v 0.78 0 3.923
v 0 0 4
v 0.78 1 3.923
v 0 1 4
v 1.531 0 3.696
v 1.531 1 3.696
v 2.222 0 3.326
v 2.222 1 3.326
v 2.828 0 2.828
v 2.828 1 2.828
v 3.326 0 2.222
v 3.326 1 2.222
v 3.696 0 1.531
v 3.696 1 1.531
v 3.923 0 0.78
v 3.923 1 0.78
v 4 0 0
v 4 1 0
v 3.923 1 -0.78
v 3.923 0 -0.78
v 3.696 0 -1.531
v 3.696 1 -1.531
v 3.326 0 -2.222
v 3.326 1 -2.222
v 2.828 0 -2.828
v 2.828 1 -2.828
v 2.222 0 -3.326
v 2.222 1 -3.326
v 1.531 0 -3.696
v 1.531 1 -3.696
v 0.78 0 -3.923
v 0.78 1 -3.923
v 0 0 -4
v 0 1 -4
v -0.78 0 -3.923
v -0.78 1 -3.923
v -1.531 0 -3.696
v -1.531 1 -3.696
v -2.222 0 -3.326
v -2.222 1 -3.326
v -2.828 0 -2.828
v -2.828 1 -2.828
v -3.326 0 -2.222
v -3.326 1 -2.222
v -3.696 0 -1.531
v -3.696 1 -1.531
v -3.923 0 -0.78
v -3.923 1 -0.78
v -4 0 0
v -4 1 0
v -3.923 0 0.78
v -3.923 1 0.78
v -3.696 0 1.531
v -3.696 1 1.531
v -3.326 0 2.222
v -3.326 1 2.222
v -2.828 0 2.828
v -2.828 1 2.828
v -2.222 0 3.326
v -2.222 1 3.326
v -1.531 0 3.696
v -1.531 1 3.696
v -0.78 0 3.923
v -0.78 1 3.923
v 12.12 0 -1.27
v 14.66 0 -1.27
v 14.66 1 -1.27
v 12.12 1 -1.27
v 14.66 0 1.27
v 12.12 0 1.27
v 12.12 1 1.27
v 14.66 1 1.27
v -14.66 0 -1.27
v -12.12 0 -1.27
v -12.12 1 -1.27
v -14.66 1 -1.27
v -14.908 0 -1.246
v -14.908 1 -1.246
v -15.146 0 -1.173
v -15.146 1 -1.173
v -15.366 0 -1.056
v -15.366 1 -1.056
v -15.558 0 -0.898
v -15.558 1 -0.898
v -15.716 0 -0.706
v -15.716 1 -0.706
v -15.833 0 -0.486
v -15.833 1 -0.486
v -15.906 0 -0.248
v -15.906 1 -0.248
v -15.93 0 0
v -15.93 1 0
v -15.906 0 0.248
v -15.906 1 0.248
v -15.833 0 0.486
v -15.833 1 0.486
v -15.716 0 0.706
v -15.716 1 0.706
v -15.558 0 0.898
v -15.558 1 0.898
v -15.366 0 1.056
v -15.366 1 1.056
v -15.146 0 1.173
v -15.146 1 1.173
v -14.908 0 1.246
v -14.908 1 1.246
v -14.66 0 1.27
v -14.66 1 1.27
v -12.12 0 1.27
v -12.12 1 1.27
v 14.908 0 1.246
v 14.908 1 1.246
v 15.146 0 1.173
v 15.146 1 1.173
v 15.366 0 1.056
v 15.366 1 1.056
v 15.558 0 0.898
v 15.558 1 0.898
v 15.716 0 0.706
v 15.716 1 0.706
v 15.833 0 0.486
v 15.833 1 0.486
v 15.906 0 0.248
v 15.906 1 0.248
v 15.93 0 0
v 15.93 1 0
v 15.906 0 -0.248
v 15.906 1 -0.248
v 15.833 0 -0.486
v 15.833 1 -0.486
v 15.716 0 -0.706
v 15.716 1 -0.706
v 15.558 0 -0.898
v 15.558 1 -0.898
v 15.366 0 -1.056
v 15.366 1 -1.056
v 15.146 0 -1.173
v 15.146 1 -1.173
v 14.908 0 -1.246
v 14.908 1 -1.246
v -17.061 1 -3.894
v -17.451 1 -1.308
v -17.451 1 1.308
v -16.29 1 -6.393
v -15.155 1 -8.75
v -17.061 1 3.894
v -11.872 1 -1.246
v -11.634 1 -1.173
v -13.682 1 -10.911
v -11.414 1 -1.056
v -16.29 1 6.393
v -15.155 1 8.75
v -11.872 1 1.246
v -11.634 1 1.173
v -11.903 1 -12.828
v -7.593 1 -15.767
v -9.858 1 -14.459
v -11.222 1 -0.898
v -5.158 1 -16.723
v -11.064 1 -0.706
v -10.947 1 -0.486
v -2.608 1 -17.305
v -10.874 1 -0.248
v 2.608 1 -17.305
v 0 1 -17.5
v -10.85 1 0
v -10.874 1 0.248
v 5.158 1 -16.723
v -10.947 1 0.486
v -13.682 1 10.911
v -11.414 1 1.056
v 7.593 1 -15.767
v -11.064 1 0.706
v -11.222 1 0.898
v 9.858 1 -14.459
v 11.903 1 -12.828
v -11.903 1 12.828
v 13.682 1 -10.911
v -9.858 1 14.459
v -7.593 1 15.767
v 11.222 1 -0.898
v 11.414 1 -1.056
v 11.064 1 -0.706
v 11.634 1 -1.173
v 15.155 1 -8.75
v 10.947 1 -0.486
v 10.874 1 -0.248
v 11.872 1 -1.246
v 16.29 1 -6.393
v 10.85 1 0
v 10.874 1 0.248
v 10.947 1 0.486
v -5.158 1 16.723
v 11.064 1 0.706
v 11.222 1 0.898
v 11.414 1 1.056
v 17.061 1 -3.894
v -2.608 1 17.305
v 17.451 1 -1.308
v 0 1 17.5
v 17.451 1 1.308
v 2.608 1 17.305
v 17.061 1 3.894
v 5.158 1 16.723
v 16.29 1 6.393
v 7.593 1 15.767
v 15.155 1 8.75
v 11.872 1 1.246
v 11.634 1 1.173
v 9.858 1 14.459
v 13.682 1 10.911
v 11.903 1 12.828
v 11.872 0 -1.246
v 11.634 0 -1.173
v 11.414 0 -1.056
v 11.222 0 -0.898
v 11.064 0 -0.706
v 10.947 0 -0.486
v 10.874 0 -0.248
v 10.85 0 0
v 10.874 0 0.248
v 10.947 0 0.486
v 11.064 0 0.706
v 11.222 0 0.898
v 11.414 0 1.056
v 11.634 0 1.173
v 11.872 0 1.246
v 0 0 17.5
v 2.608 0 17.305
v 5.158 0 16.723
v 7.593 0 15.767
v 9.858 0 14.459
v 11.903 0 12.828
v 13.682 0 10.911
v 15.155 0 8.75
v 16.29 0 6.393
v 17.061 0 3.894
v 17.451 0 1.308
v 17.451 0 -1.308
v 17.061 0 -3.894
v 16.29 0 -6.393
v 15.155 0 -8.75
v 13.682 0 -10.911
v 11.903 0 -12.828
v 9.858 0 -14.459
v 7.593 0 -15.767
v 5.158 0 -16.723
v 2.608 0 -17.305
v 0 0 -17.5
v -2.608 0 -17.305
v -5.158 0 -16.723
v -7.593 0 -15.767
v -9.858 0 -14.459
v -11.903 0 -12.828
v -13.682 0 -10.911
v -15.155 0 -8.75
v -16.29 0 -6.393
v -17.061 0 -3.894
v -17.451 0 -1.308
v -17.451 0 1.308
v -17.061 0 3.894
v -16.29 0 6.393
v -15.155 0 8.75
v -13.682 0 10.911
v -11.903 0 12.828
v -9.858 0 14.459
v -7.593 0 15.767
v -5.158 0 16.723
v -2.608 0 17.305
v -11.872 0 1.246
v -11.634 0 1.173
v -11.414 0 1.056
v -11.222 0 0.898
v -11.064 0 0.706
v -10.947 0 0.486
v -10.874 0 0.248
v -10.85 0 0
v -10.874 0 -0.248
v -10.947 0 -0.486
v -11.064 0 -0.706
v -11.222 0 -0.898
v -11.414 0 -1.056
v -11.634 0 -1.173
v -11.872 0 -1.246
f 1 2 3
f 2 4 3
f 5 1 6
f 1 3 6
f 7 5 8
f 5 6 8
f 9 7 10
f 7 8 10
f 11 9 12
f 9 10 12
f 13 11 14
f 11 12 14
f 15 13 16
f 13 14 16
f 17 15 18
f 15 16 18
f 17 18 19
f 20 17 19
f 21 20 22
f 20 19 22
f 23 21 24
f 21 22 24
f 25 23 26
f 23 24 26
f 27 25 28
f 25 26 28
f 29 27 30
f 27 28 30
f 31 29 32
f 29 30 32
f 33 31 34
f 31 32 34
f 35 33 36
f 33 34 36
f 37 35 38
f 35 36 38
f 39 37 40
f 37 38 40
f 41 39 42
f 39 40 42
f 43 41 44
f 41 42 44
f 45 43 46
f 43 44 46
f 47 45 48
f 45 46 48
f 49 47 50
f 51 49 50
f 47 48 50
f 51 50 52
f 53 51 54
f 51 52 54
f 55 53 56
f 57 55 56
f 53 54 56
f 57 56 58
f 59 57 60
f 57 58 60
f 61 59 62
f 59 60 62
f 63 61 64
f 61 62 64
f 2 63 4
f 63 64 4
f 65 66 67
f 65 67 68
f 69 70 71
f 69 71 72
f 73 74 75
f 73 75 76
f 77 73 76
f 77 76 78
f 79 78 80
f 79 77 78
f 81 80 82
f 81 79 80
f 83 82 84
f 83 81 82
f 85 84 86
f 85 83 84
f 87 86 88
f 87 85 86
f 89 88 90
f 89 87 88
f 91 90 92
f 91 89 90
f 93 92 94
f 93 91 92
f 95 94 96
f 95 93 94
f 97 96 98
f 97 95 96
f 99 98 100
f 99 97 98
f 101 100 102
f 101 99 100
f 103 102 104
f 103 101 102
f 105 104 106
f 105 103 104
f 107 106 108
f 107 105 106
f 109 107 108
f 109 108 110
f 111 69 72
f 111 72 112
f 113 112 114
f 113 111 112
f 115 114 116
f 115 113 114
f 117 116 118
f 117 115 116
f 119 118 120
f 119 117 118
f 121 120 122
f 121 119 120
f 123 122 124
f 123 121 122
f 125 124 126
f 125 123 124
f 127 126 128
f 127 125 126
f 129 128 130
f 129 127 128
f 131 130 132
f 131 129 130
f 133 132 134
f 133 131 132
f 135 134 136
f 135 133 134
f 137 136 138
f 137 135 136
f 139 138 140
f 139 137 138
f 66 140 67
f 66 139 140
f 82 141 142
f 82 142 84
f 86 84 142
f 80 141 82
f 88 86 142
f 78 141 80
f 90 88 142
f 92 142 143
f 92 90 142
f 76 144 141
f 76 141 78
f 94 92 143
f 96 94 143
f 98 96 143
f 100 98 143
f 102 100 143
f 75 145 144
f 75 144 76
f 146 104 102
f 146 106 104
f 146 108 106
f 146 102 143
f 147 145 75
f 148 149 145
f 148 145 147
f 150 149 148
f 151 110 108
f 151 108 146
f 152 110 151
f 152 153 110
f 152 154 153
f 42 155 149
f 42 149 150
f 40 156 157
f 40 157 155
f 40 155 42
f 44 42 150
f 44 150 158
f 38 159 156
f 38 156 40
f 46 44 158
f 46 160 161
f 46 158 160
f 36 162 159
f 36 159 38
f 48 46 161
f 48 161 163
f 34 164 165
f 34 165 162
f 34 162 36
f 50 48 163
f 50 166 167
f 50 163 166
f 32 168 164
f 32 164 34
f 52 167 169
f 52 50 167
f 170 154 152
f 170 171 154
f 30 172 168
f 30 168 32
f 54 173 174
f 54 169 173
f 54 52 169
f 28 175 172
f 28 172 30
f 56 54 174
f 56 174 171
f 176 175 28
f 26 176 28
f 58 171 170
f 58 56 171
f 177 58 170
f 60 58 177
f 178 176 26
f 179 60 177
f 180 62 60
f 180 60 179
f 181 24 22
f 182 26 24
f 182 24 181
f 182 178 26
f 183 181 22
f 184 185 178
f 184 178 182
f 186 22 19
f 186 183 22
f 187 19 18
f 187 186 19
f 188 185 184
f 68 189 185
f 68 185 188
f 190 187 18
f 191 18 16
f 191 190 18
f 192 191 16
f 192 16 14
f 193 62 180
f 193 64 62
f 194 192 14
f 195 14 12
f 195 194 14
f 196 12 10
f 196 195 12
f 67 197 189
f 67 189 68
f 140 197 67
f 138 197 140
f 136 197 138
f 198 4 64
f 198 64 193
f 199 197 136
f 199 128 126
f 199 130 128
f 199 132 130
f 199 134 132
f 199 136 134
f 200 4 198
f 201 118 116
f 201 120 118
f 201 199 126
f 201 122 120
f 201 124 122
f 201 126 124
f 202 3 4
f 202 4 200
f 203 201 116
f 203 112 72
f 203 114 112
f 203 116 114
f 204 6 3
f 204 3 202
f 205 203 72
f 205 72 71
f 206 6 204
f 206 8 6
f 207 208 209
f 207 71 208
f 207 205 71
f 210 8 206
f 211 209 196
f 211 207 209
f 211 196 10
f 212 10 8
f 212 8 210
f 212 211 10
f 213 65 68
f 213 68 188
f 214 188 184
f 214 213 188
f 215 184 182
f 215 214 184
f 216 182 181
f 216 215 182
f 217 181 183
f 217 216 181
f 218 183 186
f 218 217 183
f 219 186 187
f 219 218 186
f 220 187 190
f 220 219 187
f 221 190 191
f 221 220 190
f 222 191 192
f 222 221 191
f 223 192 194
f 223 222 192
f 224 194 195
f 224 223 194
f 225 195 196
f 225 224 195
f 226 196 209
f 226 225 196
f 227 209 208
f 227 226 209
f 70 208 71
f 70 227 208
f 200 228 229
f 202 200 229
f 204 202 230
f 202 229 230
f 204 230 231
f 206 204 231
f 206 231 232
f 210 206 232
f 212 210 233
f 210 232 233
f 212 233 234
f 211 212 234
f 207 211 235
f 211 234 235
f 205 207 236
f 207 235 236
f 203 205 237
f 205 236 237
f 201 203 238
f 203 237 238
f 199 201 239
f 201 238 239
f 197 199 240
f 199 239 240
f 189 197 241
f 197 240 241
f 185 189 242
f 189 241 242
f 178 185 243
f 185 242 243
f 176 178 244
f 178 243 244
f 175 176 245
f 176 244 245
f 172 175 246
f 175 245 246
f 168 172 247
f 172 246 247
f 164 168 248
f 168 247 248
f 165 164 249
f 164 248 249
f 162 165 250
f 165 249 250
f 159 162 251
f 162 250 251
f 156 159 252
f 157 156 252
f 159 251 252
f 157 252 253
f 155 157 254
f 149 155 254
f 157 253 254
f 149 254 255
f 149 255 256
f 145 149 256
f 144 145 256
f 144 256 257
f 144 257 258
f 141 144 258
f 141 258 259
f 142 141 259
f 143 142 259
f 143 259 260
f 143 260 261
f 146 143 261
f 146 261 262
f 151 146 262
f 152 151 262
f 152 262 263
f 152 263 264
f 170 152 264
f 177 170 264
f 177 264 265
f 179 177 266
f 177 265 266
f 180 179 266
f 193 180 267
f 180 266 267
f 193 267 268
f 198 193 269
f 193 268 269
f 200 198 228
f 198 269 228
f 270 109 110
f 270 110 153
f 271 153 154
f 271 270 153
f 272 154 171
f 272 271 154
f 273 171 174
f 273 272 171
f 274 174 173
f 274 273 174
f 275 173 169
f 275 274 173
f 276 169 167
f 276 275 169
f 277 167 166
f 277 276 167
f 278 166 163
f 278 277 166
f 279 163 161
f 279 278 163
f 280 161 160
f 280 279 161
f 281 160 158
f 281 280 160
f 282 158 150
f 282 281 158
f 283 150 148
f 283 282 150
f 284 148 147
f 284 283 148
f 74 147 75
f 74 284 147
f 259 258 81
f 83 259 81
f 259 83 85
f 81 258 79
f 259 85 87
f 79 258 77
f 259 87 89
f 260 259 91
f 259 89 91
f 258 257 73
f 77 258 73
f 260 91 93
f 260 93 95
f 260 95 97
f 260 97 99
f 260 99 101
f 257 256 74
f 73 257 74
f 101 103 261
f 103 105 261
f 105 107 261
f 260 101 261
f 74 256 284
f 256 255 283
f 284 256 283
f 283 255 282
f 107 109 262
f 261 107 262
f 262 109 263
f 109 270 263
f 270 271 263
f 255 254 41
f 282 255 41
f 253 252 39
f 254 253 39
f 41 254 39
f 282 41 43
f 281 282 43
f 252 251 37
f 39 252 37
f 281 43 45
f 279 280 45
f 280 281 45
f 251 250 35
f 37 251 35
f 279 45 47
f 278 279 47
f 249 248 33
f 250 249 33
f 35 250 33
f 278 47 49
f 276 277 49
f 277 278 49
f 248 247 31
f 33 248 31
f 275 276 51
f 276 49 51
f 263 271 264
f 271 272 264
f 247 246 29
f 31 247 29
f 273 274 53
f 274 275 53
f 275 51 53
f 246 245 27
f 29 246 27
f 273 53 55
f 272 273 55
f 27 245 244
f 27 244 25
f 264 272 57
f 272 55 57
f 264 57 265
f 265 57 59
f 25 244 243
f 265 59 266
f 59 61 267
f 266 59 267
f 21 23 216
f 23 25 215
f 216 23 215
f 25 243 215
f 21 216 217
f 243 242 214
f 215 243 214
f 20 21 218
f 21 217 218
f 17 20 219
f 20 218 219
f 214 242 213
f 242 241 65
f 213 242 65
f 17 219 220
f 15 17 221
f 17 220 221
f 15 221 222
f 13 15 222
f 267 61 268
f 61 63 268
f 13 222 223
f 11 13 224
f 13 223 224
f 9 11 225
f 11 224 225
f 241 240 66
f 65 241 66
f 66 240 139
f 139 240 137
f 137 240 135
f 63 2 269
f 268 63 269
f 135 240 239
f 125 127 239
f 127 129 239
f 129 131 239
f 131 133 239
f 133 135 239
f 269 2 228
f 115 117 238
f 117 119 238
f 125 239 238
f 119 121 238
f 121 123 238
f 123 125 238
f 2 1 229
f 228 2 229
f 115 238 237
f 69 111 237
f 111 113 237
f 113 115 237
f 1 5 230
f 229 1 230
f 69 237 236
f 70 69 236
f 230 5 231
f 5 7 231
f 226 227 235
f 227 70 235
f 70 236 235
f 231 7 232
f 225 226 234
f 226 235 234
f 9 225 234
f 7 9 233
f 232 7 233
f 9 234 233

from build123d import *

# Parameters (mm, degrees)
SKETCH1_R           = 17.5
BOSS_EXTRUDE1_DEPTH = 1
SKETCH2_R           = 4
CUT_EXTRUDE1_DEPTH  = 5


with BuildPart() as part:
    # Sketch1 → Boss-Extrude1 (new body)
    with BuildSketch(Plane(origin=(0, 0, 0), x_dir=(1, 0, 0), z_dir=(0, 1, 0))):
        with Locations(Location((0, 0, 0), (0, 0, 270))):
            Circle(SKETCH1_R)
        with BuildLine():
            Line((14.66, 1.27), (12.12, 1.27))
            ThreePointArc((12.12, 1.27), (10.85, 0), (12.12, -1.27))
            Line((12.12, -1.27), (14.66, -1.27))
            ThreePointArc((14.66, -1.27), (15.93, 0), (14.66, 1.27))
        make_face(mode=Mode.SUBTRACT)
        with BuildLine():
            Line((-14.66, -1.27), (-12.12, -1.27))
            ThreePointArc((-12.12, -1.27), (-10.85, 0), (-12.12, 1.27))
            Line((-12.12, 1.27), (-14.66, 1.27))
            ThreePointArc((-14.66, 1.27), (-15.93, 0), (-14.66, -1.27))
        make_face(mode=Mode.SUBTRACT)
    extrude(amount=BOSS_EXTRUDE1_DEPTH)

    # Sketch2 → Cut-Extrude1 (cut, symmetric)
    with BuildSketch(Plane(origin=(0, 1, 0), x_dir=(1, 0, 0), z_dir=(0, 1, 0))):
        with Locations(Location((0, 0, 0), (0, 0, 270))):
            Circle(SKETCH2_R)
    extrude(amount=CUT_EXTRUDE1_DEPTH, both=True, mode=Mode.SUBTRACT)


solid = part.part
